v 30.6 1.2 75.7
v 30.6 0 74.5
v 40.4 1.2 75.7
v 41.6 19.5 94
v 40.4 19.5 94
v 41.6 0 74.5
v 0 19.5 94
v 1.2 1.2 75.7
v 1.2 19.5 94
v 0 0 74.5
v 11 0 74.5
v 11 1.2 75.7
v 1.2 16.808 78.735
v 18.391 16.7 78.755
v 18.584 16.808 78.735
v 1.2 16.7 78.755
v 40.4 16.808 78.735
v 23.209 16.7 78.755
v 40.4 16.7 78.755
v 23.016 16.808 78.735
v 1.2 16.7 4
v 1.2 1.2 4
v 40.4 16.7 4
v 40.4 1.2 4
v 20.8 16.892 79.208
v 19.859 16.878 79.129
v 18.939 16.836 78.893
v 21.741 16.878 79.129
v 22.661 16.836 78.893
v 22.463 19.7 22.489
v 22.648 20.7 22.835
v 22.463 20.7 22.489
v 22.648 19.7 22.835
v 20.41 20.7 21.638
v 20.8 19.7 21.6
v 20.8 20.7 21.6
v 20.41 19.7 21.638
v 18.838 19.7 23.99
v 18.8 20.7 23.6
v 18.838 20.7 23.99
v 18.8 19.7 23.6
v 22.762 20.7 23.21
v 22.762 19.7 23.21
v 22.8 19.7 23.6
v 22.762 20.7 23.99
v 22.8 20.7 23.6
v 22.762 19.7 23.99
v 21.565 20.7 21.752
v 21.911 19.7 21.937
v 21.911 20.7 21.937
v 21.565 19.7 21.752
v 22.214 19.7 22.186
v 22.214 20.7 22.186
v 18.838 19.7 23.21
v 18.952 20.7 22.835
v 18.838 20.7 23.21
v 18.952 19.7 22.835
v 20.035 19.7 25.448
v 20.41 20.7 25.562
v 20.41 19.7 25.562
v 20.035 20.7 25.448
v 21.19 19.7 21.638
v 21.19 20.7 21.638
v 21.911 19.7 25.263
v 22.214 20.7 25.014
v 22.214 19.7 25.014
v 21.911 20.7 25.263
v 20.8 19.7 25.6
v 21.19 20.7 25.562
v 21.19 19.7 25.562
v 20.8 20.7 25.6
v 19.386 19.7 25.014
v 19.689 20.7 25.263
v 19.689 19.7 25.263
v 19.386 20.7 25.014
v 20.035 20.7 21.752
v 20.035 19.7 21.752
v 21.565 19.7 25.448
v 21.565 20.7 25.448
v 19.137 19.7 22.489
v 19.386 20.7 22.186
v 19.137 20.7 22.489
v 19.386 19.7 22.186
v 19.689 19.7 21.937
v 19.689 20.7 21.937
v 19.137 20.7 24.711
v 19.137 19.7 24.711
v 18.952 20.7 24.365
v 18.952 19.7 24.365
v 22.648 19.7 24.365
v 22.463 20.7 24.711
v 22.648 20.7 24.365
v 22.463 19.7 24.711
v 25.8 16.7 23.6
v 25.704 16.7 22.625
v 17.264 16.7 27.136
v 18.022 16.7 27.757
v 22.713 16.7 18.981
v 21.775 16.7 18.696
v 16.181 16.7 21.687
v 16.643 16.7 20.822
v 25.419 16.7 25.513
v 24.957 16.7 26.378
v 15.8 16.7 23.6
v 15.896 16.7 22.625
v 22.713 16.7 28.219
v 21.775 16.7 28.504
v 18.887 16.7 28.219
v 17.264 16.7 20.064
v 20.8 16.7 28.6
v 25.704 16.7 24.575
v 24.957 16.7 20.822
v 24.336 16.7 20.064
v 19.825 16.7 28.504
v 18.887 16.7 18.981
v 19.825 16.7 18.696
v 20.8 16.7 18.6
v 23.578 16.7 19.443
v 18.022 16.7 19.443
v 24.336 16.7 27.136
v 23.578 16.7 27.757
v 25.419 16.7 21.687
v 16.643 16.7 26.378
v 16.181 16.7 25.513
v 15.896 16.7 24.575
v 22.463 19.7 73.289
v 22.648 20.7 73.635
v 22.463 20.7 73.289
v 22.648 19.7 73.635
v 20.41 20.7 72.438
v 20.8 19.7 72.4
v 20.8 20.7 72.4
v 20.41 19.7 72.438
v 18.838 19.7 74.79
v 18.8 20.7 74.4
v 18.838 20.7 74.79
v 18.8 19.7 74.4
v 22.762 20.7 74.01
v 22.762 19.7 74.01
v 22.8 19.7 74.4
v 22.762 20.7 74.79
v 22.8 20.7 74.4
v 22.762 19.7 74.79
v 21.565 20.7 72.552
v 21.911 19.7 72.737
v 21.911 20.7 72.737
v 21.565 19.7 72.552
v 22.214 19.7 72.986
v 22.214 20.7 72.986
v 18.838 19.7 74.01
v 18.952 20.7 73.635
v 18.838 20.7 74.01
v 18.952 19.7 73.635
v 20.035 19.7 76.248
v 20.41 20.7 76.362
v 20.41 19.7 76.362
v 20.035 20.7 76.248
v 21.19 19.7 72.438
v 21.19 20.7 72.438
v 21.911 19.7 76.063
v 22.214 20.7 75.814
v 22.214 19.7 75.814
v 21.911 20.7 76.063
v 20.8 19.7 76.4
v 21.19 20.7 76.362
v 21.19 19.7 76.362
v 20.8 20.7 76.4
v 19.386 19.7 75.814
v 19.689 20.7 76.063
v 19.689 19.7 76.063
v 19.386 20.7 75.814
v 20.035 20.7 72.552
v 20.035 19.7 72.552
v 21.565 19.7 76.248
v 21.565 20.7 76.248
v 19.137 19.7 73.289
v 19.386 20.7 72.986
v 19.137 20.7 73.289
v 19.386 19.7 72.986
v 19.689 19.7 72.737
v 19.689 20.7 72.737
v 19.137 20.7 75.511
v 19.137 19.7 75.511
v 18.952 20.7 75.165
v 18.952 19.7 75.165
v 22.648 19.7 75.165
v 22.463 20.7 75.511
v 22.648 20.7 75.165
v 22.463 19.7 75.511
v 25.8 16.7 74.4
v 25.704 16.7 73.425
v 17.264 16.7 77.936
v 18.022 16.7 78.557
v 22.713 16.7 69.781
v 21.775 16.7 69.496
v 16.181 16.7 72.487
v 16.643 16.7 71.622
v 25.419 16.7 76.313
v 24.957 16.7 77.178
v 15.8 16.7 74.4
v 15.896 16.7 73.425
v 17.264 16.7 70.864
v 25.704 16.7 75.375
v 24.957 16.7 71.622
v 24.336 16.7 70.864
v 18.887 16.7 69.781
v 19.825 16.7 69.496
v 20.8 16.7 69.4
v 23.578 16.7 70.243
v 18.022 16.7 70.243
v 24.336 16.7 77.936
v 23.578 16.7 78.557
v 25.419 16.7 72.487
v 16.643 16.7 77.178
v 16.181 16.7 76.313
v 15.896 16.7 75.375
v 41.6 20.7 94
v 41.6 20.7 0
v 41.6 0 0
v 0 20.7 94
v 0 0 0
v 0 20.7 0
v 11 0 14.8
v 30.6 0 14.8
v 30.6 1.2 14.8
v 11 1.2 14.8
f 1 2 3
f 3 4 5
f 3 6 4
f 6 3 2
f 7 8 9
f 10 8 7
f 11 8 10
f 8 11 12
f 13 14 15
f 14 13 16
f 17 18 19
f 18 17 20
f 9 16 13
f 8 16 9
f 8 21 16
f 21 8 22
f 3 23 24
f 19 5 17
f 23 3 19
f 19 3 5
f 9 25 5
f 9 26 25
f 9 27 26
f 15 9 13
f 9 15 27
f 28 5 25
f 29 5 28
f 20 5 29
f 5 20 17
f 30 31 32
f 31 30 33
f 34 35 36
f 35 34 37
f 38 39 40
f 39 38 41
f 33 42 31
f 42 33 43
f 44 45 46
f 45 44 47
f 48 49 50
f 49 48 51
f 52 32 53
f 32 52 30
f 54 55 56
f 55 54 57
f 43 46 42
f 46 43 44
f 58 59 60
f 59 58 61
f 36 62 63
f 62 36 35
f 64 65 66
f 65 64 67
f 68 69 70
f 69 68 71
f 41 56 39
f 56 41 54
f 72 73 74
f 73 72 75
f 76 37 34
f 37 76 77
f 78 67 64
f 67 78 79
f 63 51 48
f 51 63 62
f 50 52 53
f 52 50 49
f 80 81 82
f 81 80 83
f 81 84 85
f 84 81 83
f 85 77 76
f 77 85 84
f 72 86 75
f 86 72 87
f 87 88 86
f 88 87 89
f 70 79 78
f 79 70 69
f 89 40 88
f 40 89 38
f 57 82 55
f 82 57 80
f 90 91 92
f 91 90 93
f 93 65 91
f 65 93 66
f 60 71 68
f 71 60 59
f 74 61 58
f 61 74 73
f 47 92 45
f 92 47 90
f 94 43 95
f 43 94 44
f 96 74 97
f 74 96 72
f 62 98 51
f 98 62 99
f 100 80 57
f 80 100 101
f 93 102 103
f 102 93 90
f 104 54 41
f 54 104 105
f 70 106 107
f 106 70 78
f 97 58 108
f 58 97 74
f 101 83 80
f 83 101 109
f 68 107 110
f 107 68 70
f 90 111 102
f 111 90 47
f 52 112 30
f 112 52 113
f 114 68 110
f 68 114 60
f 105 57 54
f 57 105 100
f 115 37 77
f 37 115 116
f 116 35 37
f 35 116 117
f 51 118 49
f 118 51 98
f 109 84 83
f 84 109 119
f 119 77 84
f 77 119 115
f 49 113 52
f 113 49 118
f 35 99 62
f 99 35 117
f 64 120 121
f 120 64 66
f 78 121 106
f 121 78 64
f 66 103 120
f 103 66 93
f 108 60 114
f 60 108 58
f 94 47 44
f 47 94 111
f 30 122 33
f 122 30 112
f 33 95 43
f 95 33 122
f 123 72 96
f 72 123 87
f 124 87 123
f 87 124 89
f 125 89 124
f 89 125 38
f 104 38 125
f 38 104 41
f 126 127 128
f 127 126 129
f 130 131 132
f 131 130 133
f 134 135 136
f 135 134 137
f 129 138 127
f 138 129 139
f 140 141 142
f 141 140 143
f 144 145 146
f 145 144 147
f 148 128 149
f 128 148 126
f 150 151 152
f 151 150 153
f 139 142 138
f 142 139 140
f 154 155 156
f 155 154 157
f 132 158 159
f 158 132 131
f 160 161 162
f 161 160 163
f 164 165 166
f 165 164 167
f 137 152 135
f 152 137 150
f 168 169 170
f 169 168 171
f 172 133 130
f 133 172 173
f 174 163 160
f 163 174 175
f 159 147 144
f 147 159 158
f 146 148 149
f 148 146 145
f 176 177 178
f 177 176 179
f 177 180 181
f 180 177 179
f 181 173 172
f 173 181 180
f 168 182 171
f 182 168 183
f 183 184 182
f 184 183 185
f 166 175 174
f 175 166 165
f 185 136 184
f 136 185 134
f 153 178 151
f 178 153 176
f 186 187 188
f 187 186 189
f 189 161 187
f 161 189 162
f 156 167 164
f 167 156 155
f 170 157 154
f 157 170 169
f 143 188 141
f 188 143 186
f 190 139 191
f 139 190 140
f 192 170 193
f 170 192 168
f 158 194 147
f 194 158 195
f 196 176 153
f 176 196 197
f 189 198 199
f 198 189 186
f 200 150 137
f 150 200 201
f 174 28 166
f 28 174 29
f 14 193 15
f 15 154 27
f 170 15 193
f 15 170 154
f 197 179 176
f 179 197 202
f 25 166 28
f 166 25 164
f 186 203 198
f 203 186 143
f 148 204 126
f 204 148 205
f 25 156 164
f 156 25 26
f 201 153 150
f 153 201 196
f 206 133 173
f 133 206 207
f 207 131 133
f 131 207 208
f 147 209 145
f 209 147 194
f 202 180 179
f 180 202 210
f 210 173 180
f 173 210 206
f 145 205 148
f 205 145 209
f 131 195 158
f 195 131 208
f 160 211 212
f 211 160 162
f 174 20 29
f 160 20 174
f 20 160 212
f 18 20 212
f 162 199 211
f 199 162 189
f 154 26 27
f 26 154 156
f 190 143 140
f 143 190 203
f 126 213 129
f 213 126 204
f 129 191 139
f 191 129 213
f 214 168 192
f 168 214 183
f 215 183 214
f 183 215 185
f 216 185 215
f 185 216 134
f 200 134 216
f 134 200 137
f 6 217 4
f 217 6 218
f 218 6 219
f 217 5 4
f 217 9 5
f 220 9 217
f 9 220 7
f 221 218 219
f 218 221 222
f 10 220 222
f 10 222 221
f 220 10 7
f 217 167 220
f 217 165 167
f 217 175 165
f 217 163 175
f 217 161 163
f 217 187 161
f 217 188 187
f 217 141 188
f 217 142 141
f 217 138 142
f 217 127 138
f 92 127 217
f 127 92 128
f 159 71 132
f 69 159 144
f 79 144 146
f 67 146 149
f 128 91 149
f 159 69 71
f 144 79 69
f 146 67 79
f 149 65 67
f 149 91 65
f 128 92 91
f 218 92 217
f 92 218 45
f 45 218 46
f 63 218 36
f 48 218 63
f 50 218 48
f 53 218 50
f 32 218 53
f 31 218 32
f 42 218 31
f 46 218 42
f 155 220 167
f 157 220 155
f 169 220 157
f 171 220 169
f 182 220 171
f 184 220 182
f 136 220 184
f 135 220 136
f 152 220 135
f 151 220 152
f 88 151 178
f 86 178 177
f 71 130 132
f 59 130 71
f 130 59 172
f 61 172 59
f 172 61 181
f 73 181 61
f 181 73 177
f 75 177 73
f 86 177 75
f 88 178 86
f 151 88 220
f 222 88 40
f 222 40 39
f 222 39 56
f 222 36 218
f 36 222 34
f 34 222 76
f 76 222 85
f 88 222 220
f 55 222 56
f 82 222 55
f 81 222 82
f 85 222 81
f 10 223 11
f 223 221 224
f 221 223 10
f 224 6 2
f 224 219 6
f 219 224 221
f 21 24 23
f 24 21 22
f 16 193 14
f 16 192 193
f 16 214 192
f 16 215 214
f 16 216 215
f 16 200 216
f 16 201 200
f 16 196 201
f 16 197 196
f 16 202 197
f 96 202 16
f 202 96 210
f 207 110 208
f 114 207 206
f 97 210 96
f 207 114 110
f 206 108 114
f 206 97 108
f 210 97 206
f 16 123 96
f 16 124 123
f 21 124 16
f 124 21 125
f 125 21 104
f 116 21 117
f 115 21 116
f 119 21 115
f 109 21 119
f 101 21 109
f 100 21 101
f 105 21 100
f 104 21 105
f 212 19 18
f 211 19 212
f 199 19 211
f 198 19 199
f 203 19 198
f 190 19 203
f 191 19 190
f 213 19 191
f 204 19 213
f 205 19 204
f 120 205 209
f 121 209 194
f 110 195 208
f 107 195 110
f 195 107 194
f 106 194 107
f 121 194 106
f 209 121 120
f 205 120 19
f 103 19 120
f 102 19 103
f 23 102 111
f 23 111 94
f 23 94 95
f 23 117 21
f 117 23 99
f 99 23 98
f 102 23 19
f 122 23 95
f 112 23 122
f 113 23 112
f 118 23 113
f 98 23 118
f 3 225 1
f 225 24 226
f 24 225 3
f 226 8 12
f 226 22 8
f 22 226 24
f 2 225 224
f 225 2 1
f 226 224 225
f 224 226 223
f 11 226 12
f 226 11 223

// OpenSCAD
// clim
commande_p = 19.2+1;
commande_w = 60+1; 
command_h = 130;

wall = 1.2;
wall_p = 4;
wall_b = 4;

// lampe justine
commande_p = 14.5+1;
commande_w = 38.2+1; 
command_h = 90;

wall = 1.2;
wall_p = 4;
wall_b = 4; //*/


difference() {
	base();
	commande();
	corner();
	tranche();

	translate([wall+commande_w/2,wall+commande_p, wall_b+commande_w/2])
		rotate([-90,0,0])
			screew();
	translate([wall+commande_w/2,wall+commande_p,command_h+wall_b-commande_w/2])
		rotate([-90,0,0])
			screew();
}


module tranche() {
	translate([wall+commande_w/4,-5,5+commande_w/4])
		cube([commande_w/2,10,command_h]);
}

module corner() {
	translate([-5,commande_p+wall_p,command_h+wall_b])
		rotate([-225,0,0])
			cube([commande_w+10,commande_p*2,commande_p*2]);
	translate([wall,commande_p+wall_p,command_h+wall_b])
		rotate([-225+35,0,0])
			cube([commande_w,commande_p,commande_p]);
}

module base() {
	cube([commande_w+wall*2, commande_p+wall_p+wall,command_h+wall_b]);
}

module commande() {
	translate([wall, wall, wall_b])
		cube([commande_w,commande_p,command_h+10]);
}

module screew() {
	color("yellow") 
		union() {
			cylinder(20, 4/2, 4/2, $fn=32);
			cylinder(5, 10/2, 0, $fn=32);
			translate([0,0,-4])
				cylinder(4, 10/2, 10/2, $fn=32);
		}
}
